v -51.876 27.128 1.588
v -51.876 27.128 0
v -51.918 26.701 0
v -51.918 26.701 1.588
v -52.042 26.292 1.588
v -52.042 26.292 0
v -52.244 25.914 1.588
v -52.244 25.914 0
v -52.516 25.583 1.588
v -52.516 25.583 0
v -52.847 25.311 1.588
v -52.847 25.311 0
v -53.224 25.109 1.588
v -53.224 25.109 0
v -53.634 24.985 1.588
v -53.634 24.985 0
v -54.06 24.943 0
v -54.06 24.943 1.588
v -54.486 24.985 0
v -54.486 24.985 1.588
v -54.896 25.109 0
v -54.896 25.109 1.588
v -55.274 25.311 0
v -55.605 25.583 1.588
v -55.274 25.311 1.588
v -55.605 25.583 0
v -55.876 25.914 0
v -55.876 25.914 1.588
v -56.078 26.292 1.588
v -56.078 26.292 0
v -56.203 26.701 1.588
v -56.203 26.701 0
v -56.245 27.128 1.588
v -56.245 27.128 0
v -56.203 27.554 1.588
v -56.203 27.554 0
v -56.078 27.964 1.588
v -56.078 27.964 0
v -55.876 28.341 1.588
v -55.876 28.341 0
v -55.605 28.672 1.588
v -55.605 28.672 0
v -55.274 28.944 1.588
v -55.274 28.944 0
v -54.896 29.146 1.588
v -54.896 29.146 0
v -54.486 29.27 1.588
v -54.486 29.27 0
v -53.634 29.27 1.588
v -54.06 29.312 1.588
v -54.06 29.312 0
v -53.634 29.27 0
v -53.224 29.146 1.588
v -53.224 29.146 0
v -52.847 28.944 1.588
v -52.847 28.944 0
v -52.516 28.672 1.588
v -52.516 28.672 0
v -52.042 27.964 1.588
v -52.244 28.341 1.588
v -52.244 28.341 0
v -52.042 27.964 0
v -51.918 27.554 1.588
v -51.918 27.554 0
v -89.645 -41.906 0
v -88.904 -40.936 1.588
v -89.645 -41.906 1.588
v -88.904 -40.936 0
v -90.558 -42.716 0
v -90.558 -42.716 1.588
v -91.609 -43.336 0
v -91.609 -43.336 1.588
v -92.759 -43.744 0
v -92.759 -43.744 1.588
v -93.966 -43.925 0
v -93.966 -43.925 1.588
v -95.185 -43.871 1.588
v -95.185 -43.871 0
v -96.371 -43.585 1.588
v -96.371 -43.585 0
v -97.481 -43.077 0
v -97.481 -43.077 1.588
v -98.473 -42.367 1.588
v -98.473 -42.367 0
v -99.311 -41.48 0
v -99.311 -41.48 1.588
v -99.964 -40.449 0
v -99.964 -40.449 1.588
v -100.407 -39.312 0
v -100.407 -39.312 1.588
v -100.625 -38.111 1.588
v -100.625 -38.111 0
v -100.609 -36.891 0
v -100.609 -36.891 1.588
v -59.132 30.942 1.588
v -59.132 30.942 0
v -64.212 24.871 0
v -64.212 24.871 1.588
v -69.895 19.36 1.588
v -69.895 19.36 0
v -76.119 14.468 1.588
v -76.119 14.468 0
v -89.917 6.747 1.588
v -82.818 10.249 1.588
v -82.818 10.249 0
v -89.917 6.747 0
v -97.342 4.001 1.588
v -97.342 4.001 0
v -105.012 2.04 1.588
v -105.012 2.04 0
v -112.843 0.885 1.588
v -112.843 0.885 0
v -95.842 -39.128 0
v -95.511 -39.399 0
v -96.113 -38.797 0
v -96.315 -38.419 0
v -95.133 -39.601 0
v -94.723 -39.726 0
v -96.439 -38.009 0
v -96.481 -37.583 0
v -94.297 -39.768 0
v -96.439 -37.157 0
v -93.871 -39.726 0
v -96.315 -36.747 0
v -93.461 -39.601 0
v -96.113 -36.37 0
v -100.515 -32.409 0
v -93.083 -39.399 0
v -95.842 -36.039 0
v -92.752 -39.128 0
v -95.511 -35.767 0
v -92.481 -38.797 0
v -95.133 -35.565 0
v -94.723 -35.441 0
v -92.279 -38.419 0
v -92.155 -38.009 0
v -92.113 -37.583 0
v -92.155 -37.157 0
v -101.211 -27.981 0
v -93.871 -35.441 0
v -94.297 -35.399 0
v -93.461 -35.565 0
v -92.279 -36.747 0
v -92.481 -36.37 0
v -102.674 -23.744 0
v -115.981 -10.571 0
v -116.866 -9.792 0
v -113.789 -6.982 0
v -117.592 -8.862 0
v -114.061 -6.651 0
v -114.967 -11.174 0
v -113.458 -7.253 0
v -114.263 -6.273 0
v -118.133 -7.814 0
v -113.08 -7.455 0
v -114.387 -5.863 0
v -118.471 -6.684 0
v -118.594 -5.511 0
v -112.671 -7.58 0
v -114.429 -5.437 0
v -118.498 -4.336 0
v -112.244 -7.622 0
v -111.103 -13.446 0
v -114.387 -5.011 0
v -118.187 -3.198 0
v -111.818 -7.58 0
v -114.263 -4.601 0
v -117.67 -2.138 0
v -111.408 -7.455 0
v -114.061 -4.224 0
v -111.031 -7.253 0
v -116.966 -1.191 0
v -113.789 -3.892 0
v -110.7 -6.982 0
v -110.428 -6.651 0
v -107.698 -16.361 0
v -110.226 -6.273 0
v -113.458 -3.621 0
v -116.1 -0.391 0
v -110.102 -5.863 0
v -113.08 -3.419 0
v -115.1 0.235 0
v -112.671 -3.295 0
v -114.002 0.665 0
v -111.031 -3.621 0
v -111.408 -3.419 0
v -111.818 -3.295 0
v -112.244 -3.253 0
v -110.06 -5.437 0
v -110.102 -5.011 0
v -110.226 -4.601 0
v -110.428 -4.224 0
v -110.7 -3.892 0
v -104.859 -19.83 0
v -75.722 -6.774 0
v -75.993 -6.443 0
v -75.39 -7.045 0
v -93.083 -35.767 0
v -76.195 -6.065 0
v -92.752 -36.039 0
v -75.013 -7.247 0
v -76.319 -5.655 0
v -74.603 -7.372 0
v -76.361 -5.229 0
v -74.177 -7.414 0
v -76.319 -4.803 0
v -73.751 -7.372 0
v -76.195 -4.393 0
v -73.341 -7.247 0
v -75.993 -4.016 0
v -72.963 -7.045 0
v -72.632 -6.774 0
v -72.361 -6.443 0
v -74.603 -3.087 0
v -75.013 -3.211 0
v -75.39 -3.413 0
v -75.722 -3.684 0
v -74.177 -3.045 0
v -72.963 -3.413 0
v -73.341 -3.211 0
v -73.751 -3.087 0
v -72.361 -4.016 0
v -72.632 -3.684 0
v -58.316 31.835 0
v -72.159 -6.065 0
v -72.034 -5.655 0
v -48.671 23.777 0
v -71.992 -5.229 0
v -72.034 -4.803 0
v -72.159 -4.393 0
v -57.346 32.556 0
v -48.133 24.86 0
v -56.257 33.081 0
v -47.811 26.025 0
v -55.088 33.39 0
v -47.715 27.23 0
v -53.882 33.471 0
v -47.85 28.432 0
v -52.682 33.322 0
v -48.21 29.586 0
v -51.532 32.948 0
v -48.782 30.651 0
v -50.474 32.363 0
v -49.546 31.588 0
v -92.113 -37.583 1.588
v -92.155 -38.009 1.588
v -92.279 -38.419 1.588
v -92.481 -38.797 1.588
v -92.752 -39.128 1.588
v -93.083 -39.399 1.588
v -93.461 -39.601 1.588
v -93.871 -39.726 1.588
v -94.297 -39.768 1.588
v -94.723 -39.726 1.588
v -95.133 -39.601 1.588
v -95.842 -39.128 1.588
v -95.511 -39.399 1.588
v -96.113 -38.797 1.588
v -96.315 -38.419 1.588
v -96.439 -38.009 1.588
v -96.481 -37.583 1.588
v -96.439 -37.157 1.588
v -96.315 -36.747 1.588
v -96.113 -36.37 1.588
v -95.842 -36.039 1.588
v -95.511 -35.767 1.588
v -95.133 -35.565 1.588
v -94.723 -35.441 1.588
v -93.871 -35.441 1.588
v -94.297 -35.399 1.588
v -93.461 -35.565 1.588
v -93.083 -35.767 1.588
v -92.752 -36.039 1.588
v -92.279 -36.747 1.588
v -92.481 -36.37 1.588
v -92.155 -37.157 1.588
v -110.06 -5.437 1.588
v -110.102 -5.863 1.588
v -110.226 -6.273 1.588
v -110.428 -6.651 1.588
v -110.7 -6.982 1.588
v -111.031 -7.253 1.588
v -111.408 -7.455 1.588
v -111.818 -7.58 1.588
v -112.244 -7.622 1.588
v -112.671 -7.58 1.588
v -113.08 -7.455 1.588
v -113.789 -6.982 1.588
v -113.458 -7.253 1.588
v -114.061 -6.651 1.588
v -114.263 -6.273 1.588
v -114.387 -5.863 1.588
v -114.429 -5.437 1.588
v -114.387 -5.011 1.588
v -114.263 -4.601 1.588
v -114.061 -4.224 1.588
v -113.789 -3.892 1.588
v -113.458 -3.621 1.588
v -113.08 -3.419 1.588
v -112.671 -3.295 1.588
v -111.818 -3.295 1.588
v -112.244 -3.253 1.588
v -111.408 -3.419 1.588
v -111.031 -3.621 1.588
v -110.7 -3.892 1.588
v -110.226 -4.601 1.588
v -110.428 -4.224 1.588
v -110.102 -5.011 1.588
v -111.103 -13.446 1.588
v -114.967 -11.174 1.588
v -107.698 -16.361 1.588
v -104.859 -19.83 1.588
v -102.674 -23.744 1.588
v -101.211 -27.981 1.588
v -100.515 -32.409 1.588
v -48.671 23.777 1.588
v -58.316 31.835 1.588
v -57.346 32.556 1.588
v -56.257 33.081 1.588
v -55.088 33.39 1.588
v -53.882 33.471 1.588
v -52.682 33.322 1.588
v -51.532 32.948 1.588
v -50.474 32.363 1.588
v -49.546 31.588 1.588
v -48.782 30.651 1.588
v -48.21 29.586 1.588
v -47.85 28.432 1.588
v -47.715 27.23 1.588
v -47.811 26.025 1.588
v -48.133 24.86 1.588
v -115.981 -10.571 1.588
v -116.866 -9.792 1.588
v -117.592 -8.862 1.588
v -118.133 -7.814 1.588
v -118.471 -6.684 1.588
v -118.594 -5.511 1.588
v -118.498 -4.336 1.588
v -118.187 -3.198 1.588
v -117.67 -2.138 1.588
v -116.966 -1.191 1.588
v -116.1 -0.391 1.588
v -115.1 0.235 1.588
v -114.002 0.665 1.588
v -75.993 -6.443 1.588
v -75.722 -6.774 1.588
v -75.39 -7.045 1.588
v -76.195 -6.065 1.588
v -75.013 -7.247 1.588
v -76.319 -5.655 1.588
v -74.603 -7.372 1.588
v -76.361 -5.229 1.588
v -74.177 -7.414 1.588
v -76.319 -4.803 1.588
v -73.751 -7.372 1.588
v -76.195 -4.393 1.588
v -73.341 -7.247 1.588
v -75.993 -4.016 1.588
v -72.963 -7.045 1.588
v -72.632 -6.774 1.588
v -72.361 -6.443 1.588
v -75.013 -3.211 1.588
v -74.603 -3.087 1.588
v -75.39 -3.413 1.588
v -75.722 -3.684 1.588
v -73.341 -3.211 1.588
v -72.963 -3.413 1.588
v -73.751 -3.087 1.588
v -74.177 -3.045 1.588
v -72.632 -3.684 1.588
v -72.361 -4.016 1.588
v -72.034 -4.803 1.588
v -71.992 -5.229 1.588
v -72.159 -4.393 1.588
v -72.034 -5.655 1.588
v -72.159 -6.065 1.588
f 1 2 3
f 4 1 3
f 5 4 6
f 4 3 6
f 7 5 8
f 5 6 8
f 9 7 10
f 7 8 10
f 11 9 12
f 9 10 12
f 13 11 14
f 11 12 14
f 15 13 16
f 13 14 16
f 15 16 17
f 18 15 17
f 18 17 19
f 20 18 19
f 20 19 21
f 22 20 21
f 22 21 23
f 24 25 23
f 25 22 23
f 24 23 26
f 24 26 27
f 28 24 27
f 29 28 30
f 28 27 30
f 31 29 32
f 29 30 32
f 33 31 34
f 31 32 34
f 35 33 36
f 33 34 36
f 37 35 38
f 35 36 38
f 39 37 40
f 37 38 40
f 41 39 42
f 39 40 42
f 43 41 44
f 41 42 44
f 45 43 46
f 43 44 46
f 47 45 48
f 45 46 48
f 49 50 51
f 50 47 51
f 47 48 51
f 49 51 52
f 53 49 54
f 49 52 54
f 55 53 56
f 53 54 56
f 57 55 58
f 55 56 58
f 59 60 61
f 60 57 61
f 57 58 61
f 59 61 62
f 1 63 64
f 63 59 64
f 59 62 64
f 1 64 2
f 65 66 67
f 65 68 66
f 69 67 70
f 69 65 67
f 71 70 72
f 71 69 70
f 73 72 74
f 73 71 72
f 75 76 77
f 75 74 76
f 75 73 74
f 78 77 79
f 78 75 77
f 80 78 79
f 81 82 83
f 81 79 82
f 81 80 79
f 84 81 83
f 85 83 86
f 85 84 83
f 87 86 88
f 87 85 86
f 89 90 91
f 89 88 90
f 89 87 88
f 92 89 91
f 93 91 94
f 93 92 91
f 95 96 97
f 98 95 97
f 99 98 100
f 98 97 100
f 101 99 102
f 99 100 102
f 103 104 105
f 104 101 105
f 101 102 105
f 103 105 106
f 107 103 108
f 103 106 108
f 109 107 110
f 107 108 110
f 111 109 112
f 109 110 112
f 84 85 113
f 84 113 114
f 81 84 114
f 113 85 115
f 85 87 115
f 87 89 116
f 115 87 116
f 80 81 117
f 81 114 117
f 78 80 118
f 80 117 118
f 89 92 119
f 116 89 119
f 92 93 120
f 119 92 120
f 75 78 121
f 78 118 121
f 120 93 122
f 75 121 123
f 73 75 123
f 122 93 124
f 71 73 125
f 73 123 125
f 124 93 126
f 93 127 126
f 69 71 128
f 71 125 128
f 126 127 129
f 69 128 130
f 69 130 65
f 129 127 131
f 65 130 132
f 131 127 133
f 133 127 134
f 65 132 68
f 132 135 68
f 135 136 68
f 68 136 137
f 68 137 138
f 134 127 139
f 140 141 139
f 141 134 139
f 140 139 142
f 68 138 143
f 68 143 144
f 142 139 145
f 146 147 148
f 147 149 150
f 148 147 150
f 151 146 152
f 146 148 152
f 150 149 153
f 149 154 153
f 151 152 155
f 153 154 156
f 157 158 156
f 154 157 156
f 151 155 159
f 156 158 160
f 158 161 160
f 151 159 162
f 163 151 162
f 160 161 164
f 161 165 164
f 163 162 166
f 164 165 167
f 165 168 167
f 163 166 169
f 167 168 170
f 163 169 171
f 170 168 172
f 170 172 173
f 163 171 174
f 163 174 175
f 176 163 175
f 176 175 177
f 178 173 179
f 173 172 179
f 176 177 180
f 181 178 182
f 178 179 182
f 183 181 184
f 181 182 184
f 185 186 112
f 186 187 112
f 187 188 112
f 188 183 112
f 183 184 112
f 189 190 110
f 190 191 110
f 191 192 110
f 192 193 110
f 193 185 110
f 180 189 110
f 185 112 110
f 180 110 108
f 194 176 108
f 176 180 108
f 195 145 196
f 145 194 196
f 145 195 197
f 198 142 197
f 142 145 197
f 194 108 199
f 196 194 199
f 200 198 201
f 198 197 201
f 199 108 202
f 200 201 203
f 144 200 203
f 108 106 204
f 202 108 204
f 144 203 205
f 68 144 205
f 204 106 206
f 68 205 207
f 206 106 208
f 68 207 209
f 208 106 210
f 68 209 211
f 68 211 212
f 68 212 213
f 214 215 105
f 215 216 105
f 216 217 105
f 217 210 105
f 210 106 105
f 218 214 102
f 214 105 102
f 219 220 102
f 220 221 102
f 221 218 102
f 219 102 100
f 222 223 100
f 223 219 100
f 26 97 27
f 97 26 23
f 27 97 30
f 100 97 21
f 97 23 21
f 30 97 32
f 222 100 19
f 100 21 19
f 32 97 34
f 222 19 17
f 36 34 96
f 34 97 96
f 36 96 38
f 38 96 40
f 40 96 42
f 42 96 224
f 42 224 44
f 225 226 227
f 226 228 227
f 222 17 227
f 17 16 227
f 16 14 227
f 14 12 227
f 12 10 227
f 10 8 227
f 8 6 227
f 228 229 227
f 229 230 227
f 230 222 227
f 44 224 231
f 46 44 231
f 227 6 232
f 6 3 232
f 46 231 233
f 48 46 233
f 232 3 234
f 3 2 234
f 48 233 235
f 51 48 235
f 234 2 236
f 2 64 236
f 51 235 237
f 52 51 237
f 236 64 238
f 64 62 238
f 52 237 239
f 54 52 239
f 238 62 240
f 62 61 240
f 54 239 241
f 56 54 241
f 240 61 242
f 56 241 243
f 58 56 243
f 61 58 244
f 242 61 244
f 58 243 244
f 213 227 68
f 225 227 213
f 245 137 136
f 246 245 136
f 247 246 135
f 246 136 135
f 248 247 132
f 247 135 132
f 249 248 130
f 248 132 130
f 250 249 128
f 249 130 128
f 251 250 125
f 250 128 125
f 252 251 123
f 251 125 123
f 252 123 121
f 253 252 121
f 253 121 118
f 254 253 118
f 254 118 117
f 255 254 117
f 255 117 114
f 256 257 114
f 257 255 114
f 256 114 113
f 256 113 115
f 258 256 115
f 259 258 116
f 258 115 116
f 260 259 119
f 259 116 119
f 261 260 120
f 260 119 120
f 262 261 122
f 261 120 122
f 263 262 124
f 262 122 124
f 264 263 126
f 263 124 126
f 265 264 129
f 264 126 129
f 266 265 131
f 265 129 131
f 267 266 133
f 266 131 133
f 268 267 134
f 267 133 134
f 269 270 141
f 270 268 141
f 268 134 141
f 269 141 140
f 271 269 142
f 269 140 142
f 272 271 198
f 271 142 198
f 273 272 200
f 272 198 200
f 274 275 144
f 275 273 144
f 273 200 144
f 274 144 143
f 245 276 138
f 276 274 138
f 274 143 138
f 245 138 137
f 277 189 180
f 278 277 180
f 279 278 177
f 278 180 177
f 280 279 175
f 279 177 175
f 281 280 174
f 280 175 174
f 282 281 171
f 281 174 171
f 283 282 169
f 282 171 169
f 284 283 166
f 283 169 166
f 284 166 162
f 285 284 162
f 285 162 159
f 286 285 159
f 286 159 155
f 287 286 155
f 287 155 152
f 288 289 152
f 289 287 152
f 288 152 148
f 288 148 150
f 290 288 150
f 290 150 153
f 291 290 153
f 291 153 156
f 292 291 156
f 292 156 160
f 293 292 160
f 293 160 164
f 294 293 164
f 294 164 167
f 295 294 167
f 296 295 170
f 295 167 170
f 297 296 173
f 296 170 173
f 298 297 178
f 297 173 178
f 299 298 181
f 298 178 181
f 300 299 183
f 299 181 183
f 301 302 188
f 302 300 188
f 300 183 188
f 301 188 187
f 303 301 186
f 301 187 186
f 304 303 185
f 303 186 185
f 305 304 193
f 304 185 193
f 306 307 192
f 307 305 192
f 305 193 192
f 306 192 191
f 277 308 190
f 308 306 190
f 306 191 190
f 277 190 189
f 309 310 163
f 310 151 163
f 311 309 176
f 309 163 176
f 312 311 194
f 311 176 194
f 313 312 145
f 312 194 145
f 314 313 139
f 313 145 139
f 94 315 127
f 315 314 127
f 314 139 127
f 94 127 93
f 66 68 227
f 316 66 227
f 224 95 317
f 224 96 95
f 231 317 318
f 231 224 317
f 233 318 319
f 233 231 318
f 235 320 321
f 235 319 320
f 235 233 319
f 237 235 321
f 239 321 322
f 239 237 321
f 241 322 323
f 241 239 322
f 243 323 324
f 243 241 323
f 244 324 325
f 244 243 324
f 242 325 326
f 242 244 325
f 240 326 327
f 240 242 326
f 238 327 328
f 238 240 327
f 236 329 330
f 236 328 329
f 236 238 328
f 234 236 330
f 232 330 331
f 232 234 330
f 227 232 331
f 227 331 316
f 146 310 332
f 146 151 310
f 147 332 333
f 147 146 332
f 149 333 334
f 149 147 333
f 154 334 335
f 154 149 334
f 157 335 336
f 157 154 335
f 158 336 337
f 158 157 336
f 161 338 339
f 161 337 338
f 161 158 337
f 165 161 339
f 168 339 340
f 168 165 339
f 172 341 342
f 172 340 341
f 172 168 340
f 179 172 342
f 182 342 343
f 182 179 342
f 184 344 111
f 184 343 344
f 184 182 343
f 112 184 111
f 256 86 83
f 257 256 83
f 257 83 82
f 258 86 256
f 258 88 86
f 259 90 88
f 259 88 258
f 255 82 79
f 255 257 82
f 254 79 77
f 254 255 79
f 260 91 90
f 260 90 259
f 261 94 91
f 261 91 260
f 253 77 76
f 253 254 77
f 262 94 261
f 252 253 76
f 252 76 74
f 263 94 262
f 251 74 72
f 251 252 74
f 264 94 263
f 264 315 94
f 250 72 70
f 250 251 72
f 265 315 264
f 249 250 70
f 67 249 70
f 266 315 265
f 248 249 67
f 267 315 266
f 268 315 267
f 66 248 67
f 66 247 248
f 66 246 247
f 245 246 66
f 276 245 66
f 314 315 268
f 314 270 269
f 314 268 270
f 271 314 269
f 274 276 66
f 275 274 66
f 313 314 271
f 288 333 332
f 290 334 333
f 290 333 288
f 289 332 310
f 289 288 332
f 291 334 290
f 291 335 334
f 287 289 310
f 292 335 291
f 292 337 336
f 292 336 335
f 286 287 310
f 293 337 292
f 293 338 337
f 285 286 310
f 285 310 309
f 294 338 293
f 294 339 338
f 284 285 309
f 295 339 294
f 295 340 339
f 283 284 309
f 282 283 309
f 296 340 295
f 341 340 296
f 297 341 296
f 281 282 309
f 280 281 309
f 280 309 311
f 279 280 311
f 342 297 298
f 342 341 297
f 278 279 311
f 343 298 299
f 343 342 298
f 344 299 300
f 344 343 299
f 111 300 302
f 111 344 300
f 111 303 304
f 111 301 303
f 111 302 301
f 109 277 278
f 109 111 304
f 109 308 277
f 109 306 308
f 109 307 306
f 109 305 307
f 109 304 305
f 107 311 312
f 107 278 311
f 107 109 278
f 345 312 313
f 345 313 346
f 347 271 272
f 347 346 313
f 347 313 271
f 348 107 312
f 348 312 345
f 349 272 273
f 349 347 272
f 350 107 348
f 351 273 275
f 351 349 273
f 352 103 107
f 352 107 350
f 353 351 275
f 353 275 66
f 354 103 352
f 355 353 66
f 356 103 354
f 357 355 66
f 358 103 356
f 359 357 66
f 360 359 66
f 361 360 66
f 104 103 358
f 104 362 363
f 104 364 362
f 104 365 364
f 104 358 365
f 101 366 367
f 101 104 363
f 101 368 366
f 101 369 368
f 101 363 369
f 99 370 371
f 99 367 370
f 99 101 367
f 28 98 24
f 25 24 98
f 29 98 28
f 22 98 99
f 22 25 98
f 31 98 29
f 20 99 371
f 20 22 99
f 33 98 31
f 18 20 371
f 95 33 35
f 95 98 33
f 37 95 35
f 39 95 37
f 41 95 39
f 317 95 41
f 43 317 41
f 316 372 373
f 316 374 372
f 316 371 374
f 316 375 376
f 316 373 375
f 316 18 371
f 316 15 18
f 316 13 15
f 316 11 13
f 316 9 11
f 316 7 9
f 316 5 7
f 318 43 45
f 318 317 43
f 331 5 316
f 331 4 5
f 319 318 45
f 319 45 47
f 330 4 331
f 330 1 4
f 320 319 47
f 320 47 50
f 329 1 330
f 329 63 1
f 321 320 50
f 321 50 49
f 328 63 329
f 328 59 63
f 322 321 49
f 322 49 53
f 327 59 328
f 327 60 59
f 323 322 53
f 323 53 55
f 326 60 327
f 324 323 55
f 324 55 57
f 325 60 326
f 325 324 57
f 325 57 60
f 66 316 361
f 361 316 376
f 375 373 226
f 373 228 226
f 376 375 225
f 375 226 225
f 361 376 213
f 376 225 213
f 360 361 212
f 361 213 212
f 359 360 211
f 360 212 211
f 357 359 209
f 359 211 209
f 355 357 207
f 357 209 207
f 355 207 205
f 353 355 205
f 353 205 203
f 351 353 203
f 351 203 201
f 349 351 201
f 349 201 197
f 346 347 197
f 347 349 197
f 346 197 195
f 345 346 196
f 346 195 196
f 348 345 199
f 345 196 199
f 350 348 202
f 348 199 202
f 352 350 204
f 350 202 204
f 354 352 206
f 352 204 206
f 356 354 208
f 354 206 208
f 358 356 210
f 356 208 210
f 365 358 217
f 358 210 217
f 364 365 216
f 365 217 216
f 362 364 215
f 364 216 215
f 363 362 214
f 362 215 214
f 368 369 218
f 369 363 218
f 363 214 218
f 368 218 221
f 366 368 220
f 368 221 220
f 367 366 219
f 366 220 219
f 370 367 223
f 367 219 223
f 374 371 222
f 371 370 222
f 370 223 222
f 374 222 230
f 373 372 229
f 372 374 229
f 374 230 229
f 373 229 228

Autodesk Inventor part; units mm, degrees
ref_plane "YZ Plane" through (0, 0, 0) normal (1, 0, 0) x (0, 1, 0)
ref_plane "XZ Plane" through (0, 0, 0) normal (0, 1, 0) x (-1, 0, 0)
ref_plane "XY Plane" through (0, 0, 0) normal (0, 0, 1) x (1, 0, 0)
sketch "Sketch1" plane through (0, 0, 0) normal (0, 0, 1) x (1, 0, 0)
  circle A0 centre (-74.1769, -5.2291) radius 2.1844
  circle A1 centre (-112.2444, -5.4371) radius 2.1844
  circle A2 centre (-94.297, -37.5832) radius 2.1844
  circle A3 centre (-54.0602, 27.1276) radius 2.1844
  arc A4 (-100.6091, -36.8907) -> (-114.967, -11.1738) centre (-125.8576, -34.1206) ccw
  arc A5 (-112.8432, 0.8846) -> (-59.1316, 30.942) centre (-120.0293, 76.745) ccw
  arc A6 (-112.8432, 0.8846) -> (-114.967, -11.1738) centre (-112.2444, -5.4371) ccw
  line L0 (-88.9043, -40.936) -> (-48.6711, 23.7771)
  arc A7 (-48.6711, 23.7771) -> (-59.1316, 30.942) centre (-54.0602, 27.1276) ccw
  arc A8 (-100.6091, -36.8907) -> (-88.9043, -40.936) centre (-94.297, -37.5832) ccw
  dimension "d6" = 25.4
  dimension "d8" = 76.2
extrude "Extrusion3" add sketch "Sketch1" along normal blind 1.5875
properties part number "Side Poly"
